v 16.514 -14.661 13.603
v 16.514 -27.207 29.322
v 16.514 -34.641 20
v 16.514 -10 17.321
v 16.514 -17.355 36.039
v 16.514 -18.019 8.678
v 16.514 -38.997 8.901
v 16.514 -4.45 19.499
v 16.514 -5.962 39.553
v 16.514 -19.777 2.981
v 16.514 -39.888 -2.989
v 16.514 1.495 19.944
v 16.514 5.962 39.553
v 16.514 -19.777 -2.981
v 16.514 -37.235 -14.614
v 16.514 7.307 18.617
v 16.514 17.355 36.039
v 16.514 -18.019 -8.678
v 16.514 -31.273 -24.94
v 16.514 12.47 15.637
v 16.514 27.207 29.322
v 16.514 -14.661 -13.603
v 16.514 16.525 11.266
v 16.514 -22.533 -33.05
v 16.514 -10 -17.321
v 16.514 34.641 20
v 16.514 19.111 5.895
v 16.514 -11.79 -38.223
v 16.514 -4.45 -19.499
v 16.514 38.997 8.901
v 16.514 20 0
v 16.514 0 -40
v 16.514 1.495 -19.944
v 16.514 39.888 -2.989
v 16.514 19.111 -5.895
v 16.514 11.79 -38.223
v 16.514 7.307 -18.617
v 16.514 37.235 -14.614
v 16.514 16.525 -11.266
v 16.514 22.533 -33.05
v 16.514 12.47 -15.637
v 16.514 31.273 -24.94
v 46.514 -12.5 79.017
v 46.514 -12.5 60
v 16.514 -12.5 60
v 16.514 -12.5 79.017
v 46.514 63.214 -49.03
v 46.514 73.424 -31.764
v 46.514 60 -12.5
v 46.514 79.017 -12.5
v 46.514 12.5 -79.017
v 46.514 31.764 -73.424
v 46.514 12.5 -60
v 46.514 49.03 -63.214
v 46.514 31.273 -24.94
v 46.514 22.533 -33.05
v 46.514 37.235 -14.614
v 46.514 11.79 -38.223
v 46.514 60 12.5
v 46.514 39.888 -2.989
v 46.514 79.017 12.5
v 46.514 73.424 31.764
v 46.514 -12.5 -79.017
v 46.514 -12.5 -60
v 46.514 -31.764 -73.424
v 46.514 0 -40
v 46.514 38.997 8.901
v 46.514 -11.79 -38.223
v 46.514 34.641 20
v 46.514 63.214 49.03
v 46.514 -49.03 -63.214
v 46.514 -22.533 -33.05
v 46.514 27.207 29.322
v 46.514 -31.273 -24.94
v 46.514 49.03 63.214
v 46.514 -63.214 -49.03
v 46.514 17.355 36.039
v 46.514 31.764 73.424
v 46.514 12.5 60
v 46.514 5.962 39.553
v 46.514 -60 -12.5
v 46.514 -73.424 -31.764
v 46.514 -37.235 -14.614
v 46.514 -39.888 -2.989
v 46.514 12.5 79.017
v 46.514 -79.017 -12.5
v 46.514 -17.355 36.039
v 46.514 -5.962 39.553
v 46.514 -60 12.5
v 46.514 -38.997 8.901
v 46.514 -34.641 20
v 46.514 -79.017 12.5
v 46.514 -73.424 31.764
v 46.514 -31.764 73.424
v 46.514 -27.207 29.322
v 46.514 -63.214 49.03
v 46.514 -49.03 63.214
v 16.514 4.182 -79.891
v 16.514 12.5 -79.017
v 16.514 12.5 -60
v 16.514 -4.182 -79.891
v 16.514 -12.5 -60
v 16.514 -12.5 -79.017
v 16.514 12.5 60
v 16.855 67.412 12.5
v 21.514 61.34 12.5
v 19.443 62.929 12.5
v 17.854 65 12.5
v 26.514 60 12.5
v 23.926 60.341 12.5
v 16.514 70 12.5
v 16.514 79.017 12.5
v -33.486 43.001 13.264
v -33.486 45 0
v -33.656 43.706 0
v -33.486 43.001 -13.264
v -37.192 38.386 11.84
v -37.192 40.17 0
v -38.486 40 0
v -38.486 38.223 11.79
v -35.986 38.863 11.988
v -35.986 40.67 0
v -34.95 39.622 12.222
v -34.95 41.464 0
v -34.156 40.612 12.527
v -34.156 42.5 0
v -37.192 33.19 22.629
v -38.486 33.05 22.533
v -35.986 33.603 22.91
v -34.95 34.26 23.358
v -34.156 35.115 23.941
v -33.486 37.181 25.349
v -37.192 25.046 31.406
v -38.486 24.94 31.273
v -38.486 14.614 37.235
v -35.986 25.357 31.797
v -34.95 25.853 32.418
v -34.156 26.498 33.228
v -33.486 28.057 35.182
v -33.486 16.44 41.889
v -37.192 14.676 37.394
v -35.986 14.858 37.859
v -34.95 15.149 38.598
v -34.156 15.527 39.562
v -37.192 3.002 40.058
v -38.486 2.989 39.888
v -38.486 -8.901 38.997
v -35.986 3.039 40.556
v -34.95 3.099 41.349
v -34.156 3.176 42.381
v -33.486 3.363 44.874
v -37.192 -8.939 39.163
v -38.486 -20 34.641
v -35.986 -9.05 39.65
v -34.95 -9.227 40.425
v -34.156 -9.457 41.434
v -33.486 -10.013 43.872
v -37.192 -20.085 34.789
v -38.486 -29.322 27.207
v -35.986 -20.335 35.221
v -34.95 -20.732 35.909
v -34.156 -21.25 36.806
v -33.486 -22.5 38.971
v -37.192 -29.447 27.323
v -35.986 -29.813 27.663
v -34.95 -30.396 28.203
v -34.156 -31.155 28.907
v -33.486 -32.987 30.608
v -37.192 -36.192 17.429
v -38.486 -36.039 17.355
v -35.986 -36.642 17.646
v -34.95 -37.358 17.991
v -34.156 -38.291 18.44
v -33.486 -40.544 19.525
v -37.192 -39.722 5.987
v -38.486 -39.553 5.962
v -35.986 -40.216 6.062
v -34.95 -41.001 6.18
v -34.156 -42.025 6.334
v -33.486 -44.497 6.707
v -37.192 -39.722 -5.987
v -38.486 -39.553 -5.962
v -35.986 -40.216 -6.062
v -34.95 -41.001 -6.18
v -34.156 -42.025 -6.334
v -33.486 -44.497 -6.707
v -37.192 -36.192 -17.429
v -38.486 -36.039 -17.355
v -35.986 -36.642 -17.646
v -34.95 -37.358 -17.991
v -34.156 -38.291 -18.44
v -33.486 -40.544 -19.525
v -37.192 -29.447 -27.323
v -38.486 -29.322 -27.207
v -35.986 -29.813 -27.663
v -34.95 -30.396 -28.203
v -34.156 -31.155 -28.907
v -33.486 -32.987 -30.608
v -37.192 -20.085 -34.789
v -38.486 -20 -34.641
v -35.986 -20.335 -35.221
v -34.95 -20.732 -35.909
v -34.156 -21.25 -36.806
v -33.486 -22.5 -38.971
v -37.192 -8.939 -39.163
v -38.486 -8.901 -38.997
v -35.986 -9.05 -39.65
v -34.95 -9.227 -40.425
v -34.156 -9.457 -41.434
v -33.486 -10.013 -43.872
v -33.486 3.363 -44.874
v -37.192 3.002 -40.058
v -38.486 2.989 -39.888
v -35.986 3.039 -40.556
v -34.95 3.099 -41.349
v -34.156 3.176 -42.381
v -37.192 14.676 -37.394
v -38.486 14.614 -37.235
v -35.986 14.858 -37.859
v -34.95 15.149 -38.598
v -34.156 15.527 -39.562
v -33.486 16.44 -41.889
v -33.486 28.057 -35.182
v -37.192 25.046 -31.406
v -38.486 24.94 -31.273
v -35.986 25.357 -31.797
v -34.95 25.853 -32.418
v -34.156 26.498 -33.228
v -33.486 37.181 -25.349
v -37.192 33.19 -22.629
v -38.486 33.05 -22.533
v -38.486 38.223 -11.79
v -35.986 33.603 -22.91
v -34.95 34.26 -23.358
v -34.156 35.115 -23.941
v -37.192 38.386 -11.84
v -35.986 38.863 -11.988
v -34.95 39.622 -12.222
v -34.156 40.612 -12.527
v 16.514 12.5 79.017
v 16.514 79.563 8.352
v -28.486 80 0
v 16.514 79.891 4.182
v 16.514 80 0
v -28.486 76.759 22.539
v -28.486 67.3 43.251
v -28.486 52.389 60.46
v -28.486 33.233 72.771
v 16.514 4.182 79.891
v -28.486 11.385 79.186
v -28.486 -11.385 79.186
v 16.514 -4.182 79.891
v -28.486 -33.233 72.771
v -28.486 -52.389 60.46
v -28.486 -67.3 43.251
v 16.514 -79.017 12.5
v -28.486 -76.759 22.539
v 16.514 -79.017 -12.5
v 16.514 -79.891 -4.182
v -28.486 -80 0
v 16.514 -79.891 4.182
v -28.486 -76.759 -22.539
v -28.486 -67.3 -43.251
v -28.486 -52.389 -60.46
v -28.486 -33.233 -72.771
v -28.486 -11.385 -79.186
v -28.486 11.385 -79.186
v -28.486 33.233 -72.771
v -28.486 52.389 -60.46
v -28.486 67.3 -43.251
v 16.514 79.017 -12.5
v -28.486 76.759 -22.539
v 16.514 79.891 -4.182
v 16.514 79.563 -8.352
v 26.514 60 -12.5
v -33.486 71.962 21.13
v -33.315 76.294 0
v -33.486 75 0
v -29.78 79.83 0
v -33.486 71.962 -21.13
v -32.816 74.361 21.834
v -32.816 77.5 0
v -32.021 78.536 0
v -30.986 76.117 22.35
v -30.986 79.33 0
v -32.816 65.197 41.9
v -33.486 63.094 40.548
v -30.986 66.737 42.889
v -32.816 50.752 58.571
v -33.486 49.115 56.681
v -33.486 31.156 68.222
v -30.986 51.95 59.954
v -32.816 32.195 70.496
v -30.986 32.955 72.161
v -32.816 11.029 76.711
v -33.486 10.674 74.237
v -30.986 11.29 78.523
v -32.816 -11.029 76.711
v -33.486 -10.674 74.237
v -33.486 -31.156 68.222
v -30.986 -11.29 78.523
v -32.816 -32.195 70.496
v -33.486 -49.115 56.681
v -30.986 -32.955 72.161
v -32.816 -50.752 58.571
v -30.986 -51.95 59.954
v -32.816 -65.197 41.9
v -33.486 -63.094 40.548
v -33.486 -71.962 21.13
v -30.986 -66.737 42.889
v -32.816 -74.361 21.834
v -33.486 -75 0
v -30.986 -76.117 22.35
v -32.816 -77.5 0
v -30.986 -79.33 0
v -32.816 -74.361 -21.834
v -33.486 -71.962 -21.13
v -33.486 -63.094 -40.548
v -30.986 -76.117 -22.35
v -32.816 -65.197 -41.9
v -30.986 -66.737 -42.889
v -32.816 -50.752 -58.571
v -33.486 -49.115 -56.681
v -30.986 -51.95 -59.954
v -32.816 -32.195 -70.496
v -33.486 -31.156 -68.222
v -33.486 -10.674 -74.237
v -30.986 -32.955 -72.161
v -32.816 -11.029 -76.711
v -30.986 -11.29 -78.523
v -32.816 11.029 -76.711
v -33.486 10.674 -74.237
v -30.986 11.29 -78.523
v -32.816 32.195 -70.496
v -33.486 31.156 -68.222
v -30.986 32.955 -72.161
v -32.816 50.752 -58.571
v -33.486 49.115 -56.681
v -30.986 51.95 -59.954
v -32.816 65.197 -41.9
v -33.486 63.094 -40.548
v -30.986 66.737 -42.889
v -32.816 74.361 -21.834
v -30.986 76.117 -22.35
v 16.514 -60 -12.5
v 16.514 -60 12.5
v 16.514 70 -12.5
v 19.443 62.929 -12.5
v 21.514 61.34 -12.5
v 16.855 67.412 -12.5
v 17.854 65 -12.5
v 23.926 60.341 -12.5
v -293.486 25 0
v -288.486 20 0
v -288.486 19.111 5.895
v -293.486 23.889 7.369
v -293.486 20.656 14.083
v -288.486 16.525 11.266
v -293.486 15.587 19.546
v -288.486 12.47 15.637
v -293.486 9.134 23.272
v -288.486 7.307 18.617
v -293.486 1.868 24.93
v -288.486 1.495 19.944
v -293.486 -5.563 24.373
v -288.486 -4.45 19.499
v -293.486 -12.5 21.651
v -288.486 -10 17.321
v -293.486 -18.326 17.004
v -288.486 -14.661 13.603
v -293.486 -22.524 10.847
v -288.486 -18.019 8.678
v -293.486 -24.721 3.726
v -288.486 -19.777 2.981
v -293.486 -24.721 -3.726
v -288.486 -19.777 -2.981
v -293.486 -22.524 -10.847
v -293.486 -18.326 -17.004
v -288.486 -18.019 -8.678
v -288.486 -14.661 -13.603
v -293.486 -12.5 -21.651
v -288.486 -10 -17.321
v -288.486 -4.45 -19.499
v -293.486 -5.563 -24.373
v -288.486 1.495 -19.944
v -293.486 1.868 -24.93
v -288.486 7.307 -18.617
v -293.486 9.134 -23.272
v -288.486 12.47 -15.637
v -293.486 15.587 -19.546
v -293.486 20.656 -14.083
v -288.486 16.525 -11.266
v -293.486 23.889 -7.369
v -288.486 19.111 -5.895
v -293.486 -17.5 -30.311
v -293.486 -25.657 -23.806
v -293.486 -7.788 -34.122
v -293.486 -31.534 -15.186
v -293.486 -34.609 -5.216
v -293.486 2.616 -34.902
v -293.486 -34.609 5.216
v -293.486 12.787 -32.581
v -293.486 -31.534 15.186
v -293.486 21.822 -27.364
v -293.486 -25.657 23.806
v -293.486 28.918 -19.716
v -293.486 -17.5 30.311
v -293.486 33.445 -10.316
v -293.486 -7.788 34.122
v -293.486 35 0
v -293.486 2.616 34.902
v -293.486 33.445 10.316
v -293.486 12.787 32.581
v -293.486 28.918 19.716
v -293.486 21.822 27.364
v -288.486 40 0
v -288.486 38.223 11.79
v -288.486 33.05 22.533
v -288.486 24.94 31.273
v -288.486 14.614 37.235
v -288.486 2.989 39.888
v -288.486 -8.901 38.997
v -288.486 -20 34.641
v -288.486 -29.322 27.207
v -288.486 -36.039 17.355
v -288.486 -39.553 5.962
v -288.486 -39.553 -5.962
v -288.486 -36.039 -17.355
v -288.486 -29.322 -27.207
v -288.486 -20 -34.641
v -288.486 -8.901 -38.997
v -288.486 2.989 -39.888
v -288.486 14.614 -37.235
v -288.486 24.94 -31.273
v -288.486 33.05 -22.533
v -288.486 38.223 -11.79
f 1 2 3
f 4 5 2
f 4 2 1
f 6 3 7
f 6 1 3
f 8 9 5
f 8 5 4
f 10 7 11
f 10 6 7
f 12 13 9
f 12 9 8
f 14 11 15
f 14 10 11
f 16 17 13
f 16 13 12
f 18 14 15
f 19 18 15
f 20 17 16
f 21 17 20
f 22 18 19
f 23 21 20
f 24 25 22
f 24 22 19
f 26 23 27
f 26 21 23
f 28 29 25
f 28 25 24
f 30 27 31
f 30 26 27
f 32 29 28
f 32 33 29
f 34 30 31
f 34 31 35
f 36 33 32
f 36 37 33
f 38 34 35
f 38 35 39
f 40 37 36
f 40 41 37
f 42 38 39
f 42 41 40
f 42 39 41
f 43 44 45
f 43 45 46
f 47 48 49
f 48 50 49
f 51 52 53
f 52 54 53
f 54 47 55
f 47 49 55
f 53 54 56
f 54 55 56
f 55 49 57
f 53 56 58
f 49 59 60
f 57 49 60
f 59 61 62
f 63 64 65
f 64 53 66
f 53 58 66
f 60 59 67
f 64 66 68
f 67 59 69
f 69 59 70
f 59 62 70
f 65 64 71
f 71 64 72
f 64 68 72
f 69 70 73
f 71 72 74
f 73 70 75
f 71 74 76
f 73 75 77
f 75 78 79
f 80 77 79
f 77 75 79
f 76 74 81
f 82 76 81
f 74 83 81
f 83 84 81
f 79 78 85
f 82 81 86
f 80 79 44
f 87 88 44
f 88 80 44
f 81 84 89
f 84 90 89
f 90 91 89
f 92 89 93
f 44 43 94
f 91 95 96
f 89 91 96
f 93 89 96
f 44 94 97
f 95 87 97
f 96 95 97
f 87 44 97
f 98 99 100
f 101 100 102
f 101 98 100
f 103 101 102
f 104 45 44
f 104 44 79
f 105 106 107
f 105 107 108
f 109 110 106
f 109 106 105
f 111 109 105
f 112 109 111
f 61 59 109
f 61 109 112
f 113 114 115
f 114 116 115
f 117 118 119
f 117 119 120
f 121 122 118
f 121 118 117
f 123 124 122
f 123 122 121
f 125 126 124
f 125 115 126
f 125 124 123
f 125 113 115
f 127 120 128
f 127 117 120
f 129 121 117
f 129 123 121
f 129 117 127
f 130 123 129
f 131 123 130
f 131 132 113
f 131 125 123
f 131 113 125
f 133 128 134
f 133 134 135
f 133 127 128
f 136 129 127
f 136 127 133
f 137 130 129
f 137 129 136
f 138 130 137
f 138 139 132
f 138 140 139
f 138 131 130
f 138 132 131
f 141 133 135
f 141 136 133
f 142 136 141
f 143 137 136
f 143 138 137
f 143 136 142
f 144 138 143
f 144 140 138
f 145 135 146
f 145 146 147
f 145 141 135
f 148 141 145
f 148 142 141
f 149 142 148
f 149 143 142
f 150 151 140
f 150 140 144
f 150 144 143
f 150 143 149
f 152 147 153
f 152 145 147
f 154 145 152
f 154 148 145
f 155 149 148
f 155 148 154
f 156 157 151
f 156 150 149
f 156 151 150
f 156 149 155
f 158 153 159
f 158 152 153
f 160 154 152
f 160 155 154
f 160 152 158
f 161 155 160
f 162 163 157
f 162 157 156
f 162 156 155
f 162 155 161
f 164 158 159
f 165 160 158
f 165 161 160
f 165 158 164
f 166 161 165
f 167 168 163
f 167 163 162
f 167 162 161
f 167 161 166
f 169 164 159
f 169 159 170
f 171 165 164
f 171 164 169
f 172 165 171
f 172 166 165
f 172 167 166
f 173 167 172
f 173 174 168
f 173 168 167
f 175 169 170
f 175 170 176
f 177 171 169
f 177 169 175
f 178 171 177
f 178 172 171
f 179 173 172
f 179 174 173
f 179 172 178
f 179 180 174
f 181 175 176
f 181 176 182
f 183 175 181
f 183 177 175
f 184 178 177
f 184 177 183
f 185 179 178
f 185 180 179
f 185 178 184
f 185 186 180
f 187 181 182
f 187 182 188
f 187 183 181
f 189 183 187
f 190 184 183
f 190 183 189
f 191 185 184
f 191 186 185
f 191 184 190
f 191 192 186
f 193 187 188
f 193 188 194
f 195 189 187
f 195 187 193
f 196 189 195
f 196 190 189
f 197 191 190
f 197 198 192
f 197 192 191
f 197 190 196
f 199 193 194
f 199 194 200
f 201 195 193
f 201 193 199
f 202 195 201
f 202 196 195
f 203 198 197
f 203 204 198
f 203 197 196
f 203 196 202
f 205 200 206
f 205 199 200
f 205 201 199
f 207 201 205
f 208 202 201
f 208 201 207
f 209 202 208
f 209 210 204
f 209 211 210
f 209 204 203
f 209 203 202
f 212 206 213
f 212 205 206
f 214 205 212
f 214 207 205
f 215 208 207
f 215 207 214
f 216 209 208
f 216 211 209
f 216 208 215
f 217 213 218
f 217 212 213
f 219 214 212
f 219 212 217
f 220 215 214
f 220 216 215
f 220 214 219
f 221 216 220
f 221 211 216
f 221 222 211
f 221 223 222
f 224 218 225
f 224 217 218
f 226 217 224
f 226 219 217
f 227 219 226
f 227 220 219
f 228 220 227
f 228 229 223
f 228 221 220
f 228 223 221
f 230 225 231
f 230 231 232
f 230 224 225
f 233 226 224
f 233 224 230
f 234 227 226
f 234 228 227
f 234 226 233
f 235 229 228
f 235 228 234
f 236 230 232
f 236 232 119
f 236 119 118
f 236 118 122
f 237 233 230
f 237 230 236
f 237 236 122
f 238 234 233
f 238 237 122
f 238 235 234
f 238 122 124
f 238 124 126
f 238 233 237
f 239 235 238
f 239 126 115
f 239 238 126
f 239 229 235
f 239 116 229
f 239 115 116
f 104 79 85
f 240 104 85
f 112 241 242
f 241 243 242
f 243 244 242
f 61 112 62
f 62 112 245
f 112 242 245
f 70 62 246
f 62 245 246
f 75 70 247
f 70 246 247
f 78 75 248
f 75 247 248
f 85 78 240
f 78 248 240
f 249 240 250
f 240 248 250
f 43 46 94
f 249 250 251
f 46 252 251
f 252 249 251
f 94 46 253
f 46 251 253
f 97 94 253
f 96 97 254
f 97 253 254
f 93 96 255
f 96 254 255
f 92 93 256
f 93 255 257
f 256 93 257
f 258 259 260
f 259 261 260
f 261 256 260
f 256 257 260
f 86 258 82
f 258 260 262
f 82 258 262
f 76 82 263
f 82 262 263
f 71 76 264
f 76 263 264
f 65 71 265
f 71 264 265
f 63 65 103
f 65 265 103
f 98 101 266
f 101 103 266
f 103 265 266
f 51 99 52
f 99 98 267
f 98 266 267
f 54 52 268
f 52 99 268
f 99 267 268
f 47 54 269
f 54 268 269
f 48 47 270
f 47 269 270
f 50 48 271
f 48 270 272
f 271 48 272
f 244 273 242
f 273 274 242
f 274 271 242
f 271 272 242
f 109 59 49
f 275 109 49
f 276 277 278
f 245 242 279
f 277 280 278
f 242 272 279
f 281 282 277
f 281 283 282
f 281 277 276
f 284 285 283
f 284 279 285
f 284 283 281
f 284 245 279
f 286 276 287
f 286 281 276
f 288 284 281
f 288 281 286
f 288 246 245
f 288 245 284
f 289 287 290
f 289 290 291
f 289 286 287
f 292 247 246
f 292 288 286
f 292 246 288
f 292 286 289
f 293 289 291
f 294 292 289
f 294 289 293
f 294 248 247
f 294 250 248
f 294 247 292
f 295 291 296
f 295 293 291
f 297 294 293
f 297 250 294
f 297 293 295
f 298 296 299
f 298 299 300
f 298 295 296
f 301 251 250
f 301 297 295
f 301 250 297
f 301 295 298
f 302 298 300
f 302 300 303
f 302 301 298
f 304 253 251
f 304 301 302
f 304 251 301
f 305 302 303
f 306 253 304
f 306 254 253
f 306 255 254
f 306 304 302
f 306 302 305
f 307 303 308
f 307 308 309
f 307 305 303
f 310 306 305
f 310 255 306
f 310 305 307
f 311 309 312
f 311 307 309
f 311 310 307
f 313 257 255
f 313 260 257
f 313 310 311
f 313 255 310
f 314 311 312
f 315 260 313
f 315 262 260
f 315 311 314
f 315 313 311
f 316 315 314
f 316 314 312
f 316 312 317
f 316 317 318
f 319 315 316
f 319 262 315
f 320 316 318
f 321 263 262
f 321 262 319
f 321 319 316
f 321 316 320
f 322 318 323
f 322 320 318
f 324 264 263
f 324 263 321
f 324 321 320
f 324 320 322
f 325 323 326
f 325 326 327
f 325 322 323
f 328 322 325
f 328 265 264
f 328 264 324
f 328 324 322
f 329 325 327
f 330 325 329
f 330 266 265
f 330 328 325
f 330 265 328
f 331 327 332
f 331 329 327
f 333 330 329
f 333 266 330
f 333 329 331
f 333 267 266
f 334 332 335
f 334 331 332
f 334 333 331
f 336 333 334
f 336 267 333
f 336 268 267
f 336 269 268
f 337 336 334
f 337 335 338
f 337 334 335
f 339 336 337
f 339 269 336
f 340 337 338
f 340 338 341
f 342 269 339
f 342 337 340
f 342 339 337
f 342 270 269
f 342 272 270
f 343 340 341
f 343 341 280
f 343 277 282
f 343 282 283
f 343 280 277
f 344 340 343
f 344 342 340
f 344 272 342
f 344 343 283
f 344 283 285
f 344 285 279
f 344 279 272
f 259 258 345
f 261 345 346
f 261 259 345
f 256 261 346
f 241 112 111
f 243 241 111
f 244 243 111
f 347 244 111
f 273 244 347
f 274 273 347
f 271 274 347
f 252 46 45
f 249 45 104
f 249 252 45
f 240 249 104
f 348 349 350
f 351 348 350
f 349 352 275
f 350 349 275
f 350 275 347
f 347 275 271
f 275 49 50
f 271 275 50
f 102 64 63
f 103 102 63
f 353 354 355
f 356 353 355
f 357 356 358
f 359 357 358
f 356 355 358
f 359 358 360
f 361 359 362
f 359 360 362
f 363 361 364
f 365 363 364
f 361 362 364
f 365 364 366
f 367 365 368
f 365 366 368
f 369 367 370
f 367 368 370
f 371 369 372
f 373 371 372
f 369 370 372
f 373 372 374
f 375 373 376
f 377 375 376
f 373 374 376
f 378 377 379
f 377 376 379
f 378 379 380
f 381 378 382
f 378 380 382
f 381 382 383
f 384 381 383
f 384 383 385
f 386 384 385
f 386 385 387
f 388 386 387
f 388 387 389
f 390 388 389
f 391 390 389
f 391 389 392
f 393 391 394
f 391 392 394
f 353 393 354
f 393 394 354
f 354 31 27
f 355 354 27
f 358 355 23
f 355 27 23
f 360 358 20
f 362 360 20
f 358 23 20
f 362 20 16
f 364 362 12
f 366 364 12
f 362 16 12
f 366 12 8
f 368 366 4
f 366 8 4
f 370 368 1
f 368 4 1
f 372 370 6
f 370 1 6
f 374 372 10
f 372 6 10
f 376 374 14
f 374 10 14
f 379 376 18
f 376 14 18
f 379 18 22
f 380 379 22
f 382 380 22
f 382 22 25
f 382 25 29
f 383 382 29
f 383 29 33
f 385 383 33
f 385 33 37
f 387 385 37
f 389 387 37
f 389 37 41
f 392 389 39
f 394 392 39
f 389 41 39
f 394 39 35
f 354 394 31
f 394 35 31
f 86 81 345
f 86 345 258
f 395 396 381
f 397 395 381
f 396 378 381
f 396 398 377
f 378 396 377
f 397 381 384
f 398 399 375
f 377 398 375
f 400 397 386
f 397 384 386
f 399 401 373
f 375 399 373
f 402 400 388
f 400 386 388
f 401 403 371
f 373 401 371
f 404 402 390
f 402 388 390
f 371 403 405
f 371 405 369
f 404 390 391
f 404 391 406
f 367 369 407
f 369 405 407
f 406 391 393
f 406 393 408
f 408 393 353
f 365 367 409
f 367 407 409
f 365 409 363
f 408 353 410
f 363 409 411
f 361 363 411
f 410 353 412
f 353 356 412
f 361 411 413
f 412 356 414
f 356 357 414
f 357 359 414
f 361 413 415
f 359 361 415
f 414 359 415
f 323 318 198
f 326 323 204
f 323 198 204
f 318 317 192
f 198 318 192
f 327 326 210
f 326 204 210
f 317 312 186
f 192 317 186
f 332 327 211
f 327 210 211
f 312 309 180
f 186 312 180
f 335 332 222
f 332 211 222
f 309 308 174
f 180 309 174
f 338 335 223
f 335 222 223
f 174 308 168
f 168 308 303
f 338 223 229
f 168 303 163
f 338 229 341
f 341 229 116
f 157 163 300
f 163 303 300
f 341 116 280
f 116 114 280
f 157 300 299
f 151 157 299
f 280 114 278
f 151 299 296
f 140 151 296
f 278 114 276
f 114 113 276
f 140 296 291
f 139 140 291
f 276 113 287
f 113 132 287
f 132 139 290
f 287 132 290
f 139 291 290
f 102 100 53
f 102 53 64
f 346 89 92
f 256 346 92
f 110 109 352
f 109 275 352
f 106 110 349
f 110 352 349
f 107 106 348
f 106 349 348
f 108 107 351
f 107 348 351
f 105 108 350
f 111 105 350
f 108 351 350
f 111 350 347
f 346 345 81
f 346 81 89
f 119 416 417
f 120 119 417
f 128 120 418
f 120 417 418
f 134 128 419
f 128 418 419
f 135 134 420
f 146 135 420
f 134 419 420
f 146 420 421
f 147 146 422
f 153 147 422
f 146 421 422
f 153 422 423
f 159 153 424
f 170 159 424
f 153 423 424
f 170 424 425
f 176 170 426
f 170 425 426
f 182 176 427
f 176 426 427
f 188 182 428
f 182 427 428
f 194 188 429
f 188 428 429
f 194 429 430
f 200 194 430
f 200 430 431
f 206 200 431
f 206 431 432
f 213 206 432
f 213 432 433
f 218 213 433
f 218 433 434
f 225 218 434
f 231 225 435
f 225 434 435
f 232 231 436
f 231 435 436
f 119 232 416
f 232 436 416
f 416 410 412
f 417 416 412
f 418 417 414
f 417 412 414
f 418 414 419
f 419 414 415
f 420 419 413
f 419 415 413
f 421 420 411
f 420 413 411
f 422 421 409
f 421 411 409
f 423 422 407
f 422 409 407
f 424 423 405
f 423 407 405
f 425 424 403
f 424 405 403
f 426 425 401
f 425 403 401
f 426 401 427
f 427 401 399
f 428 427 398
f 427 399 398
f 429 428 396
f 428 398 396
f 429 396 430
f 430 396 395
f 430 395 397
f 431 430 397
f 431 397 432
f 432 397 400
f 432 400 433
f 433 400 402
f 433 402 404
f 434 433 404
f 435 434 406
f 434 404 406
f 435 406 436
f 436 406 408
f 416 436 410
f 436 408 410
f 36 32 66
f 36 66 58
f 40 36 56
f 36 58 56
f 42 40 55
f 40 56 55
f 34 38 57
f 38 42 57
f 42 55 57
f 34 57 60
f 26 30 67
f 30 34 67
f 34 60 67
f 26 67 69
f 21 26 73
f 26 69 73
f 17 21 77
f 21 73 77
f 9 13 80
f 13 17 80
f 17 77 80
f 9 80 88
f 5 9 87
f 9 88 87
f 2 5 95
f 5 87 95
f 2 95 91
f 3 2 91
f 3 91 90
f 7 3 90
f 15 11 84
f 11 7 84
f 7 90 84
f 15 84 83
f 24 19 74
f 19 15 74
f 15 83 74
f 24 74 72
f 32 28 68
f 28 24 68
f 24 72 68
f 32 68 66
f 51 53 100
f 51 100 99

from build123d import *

# Parameters (mm, degrees)
SZKIC3_R                   = 40
SZKIC3_W                   = 25
SZKIC3_H                   = 30
WYTNIJ_WYCI_GNI_CIE1_DEPTH = 30
ZAOKR_GLENIE1_R            = 10
SZYK_KO_OWY1_COUNT         = 4
ZAOKR_GLENIE2_R            = 5
SFAZOWANIE2_SIZE           = 5


with BuildPart() as part:
    # Szkic2 → Obrót1 (revolve)
    with BuildSketch(Plane.XY):
        Polygon((-293.485716032, 20), (46.514283968, 20), (46.514283968, 80), (-33.485716032, 80), (-33.485716032, 40), (-293.485716032, 40), align=None)
    revolve(axis=Axis((-88.99, 0, 0), (1, 0, 0)))

    # Szkic3 → Wytnij-wyciągnięcie1 (cut)
    with BuildSketch(Plane(origin=(46.514283968, 0, 0), x_dir=(0, 0, -1), z_dir=(1, 0, 0))):
        Circle(SZKIC3_R)
        with Locations((0, 75)):
            Rectangle(SZKIC3_W, SZKIC3_H)
    wytnij_wyci_gni_cie1 = extrude(amount=-WYTNIJ_WYCI_GNI_CIE1_DEPTH, mode=Mode.SUBTRACT)

    # Zaokrąglenie1
    zaokr_glenie1_edges = [part.edges().sort_by_distance(p)[0] for p in [
        (16.514283968, 60, 0),
    ]]
    fillet(zaokr_glenie1_edges, radius=ZAOKR_GLENIE1_R)

    # Szyk kołowy1: Wytnij-wyciągnięcie1 ×4 about axis
    szyk_ko_owy1_axis = Axis((0, 0, 0), (1, 0, 0))
    for i in range(1, SZYK_KO_OWY1_COUNT):
        add(wytnij_wyci_gni_cie1.rotate(szyk_ko_owy1_axis, i * 360 / SZYK_KO_OWY1_COUNT), mode=Mode.SUBTRACT)

    # Zaokrąglenie2
    zaokr_glenie2_edges = [part.edges().sort_by_distance(p)[0] for p in [
        (-33.485716032, -40, 0),
        (-33.485716032, -80, 0),
    ]]
    fillet(zaokr_glenie2_edges, radius=ZAOKR_GLENIE2_R)

    # Sfazowanie2
    sfazowanie2_edges = [part.edges().sort_by_distance(p)[0] for p in [
        (-293.485716032, -40, 0),
        (-293.485716032, -20, 0),
    ]]
    chamfer(sfazowanie2_edges, length=SFAZOWANIE2_SIZE)


solid = part.part
